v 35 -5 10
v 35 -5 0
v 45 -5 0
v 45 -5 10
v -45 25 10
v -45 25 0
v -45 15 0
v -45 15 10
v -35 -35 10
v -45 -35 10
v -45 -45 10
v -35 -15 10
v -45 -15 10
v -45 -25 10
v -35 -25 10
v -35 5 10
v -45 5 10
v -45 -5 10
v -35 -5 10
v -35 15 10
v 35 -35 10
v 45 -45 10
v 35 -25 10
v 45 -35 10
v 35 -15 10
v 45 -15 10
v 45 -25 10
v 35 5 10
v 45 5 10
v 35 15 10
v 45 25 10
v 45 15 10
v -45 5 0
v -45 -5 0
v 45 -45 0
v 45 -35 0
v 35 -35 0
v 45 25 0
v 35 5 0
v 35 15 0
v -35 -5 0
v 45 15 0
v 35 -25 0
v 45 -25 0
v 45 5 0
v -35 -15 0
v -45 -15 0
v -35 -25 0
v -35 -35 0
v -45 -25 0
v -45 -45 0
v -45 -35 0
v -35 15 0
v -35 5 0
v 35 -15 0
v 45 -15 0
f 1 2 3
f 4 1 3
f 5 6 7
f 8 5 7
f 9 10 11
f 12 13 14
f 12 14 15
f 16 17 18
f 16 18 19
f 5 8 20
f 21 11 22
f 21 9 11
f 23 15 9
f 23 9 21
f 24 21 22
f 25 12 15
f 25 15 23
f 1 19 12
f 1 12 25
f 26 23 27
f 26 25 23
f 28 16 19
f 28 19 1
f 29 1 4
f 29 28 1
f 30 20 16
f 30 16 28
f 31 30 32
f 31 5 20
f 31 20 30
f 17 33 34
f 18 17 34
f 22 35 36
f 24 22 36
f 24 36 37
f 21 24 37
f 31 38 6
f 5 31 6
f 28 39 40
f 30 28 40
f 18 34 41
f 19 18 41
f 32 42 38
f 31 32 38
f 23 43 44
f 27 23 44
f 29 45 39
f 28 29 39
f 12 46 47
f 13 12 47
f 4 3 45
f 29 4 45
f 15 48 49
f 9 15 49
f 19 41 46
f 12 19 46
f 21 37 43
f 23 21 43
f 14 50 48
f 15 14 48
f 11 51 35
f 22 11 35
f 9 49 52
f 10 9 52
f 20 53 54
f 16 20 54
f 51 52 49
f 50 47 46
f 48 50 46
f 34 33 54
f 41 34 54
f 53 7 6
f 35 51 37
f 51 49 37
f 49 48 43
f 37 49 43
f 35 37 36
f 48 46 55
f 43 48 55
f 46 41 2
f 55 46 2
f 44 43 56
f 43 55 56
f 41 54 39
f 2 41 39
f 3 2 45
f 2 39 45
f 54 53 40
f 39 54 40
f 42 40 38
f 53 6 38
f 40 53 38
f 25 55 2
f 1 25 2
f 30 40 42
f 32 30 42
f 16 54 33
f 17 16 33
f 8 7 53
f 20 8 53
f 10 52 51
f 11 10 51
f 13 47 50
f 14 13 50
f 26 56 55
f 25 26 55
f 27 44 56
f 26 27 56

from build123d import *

# Parameters (mm, degrees)
F1_DEPTH = 10


with BuildPart() as f1:
    # F0 (on Top) → F1 (new body)
    with BuildSketch(Plane.XY):
        Polygon((0, -45), (45, -45), (45, -35), (35, -35), (35, -25), (45, -25), (45, -15), (35, -15), (35, -5), (45, -5), (45, 5), (35, 5), (35, 15), (45, 15), (45, 25), (35, 25), (-35, 25), (-45, 25), (-45, 15), (-35, 15), (-35, 5), (-45, 5), (-45, -5), (-35, -5), (-35, -15), (-45, -15), (-45, -25), (-35, -25), (-35, -35), (-45, -35), (-45, -45), align=None)
    extrude(amount=F1_DEPTH)


solid = f1.part
